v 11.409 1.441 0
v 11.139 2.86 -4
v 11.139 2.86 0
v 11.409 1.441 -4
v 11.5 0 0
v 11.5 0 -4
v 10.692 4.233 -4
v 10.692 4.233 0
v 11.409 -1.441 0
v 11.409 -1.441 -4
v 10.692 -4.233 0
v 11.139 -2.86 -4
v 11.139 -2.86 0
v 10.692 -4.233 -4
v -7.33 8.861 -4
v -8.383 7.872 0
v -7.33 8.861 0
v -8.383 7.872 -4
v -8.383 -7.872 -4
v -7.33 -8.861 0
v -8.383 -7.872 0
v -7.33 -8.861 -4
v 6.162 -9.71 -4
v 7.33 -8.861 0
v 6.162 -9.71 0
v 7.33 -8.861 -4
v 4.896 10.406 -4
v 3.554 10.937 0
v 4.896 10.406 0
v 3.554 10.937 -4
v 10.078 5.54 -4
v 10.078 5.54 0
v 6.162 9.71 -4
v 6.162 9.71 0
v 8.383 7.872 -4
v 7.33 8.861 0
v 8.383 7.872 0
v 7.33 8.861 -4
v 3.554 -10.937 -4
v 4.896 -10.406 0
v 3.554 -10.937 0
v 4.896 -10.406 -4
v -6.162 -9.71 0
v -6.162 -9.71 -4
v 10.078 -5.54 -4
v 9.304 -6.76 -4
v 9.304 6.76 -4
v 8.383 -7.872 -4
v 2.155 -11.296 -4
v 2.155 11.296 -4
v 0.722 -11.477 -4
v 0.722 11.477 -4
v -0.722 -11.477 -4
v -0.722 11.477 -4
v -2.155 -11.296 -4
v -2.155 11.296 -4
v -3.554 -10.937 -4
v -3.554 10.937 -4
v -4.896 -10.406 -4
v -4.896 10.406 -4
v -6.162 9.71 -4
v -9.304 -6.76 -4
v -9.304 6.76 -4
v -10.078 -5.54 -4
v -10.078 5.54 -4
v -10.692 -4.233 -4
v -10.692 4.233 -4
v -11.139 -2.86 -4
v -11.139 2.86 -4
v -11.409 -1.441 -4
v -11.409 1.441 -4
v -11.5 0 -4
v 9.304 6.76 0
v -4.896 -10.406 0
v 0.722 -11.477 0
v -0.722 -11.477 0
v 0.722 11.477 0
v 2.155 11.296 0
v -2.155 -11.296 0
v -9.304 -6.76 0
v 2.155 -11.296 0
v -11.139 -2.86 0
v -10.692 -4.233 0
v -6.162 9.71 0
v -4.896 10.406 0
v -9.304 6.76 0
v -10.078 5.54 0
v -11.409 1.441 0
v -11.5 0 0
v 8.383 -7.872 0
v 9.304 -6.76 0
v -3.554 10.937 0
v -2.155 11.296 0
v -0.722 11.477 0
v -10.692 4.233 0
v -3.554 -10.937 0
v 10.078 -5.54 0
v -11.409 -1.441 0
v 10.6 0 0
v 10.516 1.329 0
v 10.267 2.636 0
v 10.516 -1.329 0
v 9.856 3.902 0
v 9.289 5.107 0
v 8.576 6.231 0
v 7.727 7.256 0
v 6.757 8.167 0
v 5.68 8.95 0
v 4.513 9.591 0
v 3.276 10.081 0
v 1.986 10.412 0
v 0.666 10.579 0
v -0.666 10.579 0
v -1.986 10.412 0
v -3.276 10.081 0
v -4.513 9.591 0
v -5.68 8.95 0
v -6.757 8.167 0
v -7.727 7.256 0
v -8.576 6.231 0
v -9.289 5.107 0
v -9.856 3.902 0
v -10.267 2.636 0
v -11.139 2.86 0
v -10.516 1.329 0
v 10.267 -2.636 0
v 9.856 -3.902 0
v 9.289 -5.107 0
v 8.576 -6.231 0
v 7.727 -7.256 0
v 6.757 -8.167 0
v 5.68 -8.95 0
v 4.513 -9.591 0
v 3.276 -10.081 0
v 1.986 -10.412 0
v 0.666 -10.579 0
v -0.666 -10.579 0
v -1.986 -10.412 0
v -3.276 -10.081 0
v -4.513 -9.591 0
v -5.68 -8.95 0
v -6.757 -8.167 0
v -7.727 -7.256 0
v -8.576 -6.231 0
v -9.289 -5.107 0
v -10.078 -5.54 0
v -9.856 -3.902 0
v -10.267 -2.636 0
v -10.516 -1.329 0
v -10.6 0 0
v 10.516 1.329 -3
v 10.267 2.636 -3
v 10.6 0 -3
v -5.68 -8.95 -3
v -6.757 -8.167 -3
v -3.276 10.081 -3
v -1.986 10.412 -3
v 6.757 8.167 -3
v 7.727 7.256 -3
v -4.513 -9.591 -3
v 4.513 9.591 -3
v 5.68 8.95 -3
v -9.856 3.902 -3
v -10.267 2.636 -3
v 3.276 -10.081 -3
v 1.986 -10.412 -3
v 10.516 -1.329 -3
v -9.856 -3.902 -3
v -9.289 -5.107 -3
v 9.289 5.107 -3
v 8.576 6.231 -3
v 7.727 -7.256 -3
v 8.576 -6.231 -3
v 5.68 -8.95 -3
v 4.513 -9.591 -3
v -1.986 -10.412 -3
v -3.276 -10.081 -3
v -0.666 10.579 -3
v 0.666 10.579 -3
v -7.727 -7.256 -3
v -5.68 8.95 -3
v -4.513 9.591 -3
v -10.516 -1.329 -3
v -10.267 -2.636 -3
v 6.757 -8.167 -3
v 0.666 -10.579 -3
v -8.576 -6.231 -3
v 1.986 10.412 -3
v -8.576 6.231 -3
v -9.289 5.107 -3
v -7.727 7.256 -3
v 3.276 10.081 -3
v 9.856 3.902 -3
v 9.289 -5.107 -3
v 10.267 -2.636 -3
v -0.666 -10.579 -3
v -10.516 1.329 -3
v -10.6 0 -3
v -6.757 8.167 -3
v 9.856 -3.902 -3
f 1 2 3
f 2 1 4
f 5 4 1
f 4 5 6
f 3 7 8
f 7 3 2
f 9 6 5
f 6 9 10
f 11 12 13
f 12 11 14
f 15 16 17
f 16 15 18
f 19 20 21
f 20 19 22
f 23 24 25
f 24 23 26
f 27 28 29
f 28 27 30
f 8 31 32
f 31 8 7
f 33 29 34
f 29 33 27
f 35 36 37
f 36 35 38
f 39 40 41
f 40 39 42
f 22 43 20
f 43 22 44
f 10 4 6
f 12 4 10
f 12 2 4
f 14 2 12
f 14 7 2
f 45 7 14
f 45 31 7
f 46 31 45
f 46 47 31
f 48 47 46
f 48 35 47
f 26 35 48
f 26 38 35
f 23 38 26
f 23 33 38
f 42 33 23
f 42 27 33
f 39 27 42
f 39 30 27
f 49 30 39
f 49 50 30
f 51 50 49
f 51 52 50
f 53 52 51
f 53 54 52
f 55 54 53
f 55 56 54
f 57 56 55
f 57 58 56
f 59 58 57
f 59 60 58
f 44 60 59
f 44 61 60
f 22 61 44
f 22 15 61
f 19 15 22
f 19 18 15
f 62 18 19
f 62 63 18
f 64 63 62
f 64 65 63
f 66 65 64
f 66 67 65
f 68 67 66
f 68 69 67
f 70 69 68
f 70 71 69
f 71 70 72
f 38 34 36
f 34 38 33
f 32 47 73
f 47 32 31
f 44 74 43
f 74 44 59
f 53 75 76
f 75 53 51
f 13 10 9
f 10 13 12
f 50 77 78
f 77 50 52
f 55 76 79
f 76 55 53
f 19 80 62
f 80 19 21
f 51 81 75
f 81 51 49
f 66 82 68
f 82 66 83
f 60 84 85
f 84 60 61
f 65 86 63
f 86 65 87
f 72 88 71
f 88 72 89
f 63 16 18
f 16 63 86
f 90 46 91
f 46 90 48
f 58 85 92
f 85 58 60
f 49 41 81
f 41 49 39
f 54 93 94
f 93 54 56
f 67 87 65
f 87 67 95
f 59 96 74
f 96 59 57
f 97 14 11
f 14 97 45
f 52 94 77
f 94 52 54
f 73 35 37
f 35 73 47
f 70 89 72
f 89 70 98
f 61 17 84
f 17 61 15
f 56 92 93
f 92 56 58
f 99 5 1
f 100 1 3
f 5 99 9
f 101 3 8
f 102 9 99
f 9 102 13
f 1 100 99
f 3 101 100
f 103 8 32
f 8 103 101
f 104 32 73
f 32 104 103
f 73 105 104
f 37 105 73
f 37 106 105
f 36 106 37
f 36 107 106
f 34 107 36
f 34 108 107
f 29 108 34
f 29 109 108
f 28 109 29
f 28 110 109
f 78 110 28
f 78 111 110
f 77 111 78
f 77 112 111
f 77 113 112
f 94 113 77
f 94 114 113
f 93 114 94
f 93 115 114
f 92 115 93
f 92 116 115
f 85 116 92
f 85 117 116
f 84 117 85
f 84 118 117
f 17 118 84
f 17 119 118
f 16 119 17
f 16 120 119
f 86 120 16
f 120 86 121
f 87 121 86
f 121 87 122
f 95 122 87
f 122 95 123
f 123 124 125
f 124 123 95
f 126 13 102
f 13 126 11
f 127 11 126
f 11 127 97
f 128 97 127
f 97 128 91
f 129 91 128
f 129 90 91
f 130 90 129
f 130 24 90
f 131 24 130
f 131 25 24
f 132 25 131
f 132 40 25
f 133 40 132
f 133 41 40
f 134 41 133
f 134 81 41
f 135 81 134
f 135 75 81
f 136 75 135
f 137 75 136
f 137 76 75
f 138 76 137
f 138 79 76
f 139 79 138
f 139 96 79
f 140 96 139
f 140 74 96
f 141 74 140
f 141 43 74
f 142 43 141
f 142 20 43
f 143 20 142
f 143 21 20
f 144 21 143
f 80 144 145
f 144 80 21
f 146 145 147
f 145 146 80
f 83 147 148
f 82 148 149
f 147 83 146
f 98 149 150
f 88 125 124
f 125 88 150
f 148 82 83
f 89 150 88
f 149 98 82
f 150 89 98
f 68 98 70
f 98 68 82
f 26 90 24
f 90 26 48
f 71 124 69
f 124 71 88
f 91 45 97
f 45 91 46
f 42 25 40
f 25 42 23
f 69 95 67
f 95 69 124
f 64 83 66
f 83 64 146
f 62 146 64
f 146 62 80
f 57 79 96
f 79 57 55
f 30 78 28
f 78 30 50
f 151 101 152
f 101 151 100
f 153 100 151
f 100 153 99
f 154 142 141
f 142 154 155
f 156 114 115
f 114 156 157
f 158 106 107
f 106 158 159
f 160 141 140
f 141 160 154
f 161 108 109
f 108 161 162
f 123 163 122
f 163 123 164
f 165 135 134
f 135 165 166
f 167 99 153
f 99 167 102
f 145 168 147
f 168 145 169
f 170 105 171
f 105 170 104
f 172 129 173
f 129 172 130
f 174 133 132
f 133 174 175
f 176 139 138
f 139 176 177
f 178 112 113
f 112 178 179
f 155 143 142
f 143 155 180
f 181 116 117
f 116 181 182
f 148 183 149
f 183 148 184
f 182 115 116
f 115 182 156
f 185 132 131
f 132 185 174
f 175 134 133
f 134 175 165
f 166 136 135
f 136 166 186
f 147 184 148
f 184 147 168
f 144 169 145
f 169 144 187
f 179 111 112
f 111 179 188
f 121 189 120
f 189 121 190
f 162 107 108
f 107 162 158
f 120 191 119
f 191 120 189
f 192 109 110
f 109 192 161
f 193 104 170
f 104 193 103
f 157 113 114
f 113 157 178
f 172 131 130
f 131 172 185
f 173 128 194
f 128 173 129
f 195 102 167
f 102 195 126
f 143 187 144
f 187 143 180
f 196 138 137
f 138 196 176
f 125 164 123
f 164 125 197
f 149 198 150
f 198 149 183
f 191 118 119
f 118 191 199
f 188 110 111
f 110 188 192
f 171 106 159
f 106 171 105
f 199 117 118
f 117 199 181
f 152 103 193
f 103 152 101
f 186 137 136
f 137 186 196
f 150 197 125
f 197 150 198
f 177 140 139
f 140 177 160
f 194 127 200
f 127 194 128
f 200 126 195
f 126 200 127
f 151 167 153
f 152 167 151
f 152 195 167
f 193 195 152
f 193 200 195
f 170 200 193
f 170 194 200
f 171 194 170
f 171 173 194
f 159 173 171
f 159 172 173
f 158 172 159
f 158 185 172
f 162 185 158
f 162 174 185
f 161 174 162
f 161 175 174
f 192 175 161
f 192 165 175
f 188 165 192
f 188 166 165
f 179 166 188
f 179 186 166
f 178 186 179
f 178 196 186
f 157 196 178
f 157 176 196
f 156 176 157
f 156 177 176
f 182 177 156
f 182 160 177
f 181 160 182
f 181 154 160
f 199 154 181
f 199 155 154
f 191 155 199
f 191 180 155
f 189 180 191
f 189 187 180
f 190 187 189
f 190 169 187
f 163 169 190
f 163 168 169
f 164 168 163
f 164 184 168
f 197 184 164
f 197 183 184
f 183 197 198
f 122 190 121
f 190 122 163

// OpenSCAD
$fn = 50;


difference() {
	union() {
		translate(v = [0, 0, -4.0000000000]) {
			cylinder(h = 4, r = 11.5000000000);
		}
	}
	union() {
		#translate(v = [0, 0, -3.0000000000]) {
			cylinder(h = 3, r = 10.6000000000);
		}
	}
}
